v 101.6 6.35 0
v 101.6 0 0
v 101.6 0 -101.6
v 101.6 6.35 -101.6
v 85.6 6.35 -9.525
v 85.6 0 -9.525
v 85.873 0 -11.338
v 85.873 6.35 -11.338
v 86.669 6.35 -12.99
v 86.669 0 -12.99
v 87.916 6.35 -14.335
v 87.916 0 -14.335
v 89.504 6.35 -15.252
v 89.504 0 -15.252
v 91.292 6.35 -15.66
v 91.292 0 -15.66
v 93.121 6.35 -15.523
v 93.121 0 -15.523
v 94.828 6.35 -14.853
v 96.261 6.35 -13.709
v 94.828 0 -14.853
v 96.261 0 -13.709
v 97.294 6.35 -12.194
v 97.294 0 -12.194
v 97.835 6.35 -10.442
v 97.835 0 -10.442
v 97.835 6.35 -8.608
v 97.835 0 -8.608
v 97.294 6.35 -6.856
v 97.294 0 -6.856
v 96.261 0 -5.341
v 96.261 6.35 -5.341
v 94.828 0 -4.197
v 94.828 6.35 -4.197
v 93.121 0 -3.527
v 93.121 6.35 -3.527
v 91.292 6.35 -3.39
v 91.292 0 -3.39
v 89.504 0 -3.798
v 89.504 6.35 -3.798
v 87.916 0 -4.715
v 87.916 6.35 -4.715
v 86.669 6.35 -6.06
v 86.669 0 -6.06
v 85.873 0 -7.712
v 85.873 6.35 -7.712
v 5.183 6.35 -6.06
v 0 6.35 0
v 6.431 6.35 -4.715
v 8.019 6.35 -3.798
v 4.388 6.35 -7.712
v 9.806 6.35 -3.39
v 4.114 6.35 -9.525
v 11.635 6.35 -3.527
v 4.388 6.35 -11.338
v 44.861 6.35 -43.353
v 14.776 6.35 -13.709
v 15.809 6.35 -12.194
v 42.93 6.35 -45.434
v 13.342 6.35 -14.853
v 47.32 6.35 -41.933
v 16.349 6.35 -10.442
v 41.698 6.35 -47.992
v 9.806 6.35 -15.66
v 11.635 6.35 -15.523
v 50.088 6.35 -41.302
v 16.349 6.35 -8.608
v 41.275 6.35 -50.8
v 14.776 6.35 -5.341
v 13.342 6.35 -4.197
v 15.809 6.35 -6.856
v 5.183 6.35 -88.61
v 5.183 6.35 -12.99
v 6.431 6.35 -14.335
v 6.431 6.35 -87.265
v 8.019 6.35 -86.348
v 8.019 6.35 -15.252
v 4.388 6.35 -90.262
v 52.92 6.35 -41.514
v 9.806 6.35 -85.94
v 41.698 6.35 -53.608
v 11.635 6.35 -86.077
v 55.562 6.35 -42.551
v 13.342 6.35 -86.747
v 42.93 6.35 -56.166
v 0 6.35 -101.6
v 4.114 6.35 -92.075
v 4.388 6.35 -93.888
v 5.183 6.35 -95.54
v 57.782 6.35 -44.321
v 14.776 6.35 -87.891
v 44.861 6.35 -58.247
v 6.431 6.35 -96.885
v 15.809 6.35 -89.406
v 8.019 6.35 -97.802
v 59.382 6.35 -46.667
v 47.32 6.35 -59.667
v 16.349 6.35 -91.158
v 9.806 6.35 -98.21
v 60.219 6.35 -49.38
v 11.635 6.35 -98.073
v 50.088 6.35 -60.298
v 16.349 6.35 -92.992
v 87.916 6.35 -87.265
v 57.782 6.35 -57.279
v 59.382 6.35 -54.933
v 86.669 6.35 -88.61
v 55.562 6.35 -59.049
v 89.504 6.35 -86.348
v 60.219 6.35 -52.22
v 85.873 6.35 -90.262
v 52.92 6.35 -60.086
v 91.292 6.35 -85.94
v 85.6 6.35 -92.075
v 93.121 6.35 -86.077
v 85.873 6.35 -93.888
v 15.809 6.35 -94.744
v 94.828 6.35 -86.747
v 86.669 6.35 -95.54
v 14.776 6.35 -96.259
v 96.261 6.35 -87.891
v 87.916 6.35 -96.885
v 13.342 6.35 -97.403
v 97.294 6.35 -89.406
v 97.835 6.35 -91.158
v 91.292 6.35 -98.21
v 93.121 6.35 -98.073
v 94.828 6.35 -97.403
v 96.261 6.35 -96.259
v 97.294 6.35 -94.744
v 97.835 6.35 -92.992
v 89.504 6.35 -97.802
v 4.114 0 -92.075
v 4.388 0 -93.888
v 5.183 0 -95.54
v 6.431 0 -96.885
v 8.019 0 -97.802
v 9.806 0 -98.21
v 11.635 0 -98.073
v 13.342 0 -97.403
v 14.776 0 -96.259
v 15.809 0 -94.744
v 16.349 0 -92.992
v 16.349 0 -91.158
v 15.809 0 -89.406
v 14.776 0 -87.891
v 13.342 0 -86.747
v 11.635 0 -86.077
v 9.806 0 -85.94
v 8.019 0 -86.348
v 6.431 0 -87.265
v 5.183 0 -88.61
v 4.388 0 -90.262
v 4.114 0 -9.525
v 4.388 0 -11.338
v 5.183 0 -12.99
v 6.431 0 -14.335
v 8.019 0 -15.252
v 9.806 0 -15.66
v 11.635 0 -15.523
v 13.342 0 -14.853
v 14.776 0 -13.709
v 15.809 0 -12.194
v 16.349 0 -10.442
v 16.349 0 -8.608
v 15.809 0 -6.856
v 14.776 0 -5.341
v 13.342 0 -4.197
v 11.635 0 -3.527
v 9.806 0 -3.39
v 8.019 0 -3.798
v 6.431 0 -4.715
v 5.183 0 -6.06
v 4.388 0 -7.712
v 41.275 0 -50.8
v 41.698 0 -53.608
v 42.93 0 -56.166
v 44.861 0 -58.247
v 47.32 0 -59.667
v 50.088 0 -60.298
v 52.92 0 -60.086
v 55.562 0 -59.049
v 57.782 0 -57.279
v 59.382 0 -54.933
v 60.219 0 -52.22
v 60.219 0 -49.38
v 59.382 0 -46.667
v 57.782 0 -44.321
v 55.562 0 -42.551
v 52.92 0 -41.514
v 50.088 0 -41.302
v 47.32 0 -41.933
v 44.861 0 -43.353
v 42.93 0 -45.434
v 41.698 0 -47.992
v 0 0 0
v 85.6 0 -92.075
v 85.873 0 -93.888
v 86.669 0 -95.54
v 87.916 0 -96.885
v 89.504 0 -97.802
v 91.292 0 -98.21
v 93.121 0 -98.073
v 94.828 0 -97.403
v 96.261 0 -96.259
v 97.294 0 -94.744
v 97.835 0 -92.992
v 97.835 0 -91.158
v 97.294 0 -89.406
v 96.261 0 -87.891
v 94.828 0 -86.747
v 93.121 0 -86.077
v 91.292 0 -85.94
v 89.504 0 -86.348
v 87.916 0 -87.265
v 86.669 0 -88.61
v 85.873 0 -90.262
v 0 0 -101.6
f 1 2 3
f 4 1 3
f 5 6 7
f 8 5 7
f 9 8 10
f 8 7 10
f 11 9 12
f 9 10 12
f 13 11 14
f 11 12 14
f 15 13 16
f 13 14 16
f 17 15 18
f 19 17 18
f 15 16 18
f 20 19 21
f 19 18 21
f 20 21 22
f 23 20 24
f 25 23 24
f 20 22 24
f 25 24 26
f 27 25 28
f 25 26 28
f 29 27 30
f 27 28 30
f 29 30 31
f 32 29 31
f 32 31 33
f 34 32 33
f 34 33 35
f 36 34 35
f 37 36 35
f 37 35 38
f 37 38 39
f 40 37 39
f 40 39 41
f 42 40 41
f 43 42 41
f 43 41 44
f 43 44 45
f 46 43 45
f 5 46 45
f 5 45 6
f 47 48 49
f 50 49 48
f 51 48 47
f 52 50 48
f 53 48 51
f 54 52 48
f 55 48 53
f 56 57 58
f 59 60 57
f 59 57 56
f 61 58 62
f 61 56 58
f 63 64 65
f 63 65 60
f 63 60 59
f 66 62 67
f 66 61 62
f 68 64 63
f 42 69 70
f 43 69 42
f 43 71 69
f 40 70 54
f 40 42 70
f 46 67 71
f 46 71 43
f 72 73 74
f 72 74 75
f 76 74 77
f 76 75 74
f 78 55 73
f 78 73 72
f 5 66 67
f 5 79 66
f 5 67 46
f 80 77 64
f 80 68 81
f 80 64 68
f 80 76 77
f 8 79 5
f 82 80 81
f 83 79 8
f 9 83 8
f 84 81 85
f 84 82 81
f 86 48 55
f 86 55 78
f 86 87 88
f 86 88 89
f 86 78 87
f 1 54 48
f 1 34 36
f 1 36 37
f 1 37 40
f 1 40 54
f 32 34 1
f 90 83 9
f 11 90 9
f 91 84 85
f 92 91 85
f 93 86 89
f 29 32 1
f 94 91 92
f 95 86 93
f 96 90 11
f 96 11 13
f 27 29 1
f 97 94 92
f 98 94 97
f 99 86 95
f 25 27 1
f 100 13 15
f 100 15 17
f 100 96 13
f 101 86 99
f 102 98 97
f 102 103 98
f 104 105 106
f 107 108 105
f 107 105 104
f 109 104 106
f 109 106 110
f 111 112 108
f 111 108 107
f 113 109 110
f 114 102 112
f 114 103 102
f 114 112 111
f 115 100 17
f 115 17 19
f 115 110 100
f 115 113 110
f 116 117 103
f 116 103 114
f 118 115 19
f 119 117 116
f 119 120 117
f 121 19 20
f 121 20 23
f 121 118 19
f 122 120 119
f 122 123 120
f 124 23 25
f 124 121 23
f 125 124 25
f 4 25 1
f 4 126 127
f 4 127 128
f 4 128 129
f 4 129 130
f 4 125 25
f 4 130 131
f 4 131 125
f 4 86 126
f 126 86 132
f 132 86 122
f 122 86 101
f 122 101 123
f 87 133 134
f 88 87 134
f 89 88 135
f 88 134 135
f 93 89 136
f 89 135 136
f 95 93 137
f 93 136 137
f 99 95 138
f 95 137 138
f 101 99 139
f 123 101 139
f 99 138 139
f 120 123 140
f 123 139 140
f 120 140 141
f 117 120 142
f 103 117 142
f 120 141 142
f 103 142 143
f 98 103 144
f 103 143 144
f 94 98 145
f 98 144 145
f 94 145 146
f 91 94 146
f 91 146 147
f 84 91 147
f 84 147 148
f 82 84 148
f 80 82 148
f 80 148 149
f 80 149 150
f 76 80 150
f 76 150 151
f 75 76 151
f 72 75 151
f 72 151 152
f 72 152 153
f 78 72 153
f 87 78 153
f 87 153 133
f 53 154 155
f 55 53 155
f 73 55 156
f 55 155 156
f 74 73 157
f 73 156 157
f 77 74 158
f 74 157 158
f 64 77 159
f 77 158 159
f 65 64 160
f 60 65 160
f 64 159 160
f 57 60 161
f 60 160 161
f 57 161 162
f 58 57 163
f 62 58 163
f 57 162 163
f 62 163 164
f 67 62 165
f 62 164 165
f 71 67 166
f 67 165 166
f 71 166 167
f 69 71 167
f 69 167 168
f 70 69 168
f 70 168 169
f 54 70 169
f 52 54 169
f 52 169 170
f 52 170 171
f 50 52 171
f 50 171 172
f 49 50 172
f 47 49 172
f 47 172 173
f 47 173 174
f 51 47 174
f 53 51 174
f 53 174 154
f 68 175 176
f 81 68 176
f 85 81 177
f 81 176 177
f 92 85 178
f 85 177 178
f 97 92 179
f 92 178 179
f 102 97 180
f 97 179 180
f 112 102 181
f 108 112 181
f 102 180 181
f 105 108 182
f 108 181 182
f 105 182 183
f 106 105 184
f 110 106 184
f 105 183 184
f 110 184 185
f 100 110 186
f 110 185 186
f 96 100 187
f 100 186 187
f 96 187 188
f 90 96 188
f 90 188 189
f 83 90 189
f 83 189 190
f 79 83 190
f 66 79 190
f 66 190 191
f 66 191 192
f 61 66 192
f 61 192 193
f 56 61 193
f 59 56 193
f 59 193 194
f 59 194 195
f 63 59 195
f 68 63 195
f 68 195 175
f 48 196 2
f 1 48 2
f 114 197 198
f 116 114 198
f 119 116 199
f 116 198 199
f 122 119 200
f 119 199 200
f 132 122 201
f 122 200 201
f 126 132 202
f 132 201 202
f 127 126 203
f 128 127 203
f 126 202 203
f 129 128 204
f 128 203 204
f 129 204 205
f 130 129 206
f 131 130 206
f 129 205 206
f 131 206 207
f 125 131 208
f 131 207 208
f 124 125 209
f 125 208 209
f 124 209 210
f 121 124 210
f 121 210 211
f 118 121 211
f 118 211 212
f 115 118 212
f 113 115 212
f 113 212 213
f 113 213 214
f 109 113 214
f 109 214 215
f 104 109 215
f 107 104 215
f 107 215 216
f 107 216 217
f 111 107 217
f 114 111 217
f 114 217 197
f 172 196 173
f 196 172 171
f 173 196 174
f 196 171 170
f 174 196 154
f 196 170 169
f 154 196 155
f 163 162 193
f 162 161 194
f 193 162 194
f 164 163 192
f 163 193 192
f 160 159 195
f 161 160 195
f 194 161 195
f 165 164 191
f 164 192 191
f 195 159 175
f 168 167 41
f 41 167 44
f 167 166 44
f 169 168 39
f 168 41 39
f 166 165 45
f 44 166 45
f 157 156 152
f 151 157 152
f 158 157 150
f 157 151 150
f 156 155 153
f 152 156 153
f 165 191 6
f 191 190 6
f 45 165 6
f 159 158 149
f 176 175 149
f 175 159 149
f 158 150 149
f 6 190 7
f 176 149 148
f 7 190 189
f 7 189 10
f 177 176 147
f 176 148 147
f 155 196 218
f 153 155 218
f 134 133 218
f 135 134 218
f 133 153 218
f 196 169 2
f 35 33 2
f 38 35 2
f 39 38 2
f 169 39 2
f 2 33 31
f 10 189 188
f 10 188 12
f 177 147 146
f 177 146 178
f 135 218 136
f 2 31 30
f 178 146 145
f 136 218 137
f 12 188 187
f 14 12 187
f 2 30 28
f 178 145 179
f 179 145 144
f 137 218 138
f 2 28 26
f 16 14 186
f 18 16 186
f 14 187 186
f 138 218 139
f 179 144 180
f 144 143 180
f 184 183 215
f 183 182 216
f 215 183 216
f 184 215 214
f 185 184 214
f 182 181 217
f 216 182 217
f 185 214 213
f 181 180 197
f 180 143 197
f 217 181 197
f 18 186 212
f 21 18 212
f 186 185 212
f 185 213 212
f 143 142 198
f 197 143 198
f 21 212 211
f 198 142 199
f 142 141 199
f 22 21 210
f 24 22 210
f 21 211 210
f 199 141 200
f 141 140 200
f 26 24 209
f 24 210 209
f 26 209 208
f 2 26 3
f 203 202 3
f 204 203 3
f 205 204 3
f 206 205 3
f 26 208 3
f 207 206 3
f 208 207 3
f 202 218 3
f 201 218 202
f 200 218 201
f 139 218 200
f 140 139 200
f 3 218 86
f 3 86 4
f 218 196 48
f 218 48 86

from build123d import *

# Parameters (mm, degrees)
SKETCH1_W                   = 101.6
SKETCH1_H                   = 101.6
BOSS_EXTRUDE1_DEPTH         = 6.35
F_9_16_12_TAPPED_HOLE1_D    = 12.30376
F_3_4_0_75_DIAMETER_HOLE1_D = 19.05


with BuildPart() as part:
    # Sketch1 → Boss-Extrude1 (new body)
    with BuildSketch(Plane(origin=(0, 0, 0), x_dir=(1, 0, 0), z_dir=(0, 1, 0))):
        with Locations((50.8, 50.8)):
            Rectangle(SKETCH1_W, SKETCH1_H)
    extrude(amount=BOSS_EXTRUDE1_DEPTH)

    # 9/16-12 Tapped Hole1 (through all)
    with Locations(Plane(origin=(0, 6.35, 0), x_dir=(1, 0, 0), z_dir=(0, 1, 0))):
        with Locations((10.266147992, 92.075), (91.751726771, 9.525), (91.751726771, 92.075), (10.266147992, 9.525)):
            Hole(F_9_16_12_TAPPED_HOLE1_D / 2)

    # 3/4 (0.75) Diameter Hole1 (through all)
    with Locations(Plane(origin=(0, 6.35, 0), x_dir=(1, 0, 0), z_dir=(0, 1, 0))):
        with Locations((50.8, 50.8)):
            Hole(F_3_4_0_75_DIAMETER_HOLE1_D / 2)


solid = part.part
